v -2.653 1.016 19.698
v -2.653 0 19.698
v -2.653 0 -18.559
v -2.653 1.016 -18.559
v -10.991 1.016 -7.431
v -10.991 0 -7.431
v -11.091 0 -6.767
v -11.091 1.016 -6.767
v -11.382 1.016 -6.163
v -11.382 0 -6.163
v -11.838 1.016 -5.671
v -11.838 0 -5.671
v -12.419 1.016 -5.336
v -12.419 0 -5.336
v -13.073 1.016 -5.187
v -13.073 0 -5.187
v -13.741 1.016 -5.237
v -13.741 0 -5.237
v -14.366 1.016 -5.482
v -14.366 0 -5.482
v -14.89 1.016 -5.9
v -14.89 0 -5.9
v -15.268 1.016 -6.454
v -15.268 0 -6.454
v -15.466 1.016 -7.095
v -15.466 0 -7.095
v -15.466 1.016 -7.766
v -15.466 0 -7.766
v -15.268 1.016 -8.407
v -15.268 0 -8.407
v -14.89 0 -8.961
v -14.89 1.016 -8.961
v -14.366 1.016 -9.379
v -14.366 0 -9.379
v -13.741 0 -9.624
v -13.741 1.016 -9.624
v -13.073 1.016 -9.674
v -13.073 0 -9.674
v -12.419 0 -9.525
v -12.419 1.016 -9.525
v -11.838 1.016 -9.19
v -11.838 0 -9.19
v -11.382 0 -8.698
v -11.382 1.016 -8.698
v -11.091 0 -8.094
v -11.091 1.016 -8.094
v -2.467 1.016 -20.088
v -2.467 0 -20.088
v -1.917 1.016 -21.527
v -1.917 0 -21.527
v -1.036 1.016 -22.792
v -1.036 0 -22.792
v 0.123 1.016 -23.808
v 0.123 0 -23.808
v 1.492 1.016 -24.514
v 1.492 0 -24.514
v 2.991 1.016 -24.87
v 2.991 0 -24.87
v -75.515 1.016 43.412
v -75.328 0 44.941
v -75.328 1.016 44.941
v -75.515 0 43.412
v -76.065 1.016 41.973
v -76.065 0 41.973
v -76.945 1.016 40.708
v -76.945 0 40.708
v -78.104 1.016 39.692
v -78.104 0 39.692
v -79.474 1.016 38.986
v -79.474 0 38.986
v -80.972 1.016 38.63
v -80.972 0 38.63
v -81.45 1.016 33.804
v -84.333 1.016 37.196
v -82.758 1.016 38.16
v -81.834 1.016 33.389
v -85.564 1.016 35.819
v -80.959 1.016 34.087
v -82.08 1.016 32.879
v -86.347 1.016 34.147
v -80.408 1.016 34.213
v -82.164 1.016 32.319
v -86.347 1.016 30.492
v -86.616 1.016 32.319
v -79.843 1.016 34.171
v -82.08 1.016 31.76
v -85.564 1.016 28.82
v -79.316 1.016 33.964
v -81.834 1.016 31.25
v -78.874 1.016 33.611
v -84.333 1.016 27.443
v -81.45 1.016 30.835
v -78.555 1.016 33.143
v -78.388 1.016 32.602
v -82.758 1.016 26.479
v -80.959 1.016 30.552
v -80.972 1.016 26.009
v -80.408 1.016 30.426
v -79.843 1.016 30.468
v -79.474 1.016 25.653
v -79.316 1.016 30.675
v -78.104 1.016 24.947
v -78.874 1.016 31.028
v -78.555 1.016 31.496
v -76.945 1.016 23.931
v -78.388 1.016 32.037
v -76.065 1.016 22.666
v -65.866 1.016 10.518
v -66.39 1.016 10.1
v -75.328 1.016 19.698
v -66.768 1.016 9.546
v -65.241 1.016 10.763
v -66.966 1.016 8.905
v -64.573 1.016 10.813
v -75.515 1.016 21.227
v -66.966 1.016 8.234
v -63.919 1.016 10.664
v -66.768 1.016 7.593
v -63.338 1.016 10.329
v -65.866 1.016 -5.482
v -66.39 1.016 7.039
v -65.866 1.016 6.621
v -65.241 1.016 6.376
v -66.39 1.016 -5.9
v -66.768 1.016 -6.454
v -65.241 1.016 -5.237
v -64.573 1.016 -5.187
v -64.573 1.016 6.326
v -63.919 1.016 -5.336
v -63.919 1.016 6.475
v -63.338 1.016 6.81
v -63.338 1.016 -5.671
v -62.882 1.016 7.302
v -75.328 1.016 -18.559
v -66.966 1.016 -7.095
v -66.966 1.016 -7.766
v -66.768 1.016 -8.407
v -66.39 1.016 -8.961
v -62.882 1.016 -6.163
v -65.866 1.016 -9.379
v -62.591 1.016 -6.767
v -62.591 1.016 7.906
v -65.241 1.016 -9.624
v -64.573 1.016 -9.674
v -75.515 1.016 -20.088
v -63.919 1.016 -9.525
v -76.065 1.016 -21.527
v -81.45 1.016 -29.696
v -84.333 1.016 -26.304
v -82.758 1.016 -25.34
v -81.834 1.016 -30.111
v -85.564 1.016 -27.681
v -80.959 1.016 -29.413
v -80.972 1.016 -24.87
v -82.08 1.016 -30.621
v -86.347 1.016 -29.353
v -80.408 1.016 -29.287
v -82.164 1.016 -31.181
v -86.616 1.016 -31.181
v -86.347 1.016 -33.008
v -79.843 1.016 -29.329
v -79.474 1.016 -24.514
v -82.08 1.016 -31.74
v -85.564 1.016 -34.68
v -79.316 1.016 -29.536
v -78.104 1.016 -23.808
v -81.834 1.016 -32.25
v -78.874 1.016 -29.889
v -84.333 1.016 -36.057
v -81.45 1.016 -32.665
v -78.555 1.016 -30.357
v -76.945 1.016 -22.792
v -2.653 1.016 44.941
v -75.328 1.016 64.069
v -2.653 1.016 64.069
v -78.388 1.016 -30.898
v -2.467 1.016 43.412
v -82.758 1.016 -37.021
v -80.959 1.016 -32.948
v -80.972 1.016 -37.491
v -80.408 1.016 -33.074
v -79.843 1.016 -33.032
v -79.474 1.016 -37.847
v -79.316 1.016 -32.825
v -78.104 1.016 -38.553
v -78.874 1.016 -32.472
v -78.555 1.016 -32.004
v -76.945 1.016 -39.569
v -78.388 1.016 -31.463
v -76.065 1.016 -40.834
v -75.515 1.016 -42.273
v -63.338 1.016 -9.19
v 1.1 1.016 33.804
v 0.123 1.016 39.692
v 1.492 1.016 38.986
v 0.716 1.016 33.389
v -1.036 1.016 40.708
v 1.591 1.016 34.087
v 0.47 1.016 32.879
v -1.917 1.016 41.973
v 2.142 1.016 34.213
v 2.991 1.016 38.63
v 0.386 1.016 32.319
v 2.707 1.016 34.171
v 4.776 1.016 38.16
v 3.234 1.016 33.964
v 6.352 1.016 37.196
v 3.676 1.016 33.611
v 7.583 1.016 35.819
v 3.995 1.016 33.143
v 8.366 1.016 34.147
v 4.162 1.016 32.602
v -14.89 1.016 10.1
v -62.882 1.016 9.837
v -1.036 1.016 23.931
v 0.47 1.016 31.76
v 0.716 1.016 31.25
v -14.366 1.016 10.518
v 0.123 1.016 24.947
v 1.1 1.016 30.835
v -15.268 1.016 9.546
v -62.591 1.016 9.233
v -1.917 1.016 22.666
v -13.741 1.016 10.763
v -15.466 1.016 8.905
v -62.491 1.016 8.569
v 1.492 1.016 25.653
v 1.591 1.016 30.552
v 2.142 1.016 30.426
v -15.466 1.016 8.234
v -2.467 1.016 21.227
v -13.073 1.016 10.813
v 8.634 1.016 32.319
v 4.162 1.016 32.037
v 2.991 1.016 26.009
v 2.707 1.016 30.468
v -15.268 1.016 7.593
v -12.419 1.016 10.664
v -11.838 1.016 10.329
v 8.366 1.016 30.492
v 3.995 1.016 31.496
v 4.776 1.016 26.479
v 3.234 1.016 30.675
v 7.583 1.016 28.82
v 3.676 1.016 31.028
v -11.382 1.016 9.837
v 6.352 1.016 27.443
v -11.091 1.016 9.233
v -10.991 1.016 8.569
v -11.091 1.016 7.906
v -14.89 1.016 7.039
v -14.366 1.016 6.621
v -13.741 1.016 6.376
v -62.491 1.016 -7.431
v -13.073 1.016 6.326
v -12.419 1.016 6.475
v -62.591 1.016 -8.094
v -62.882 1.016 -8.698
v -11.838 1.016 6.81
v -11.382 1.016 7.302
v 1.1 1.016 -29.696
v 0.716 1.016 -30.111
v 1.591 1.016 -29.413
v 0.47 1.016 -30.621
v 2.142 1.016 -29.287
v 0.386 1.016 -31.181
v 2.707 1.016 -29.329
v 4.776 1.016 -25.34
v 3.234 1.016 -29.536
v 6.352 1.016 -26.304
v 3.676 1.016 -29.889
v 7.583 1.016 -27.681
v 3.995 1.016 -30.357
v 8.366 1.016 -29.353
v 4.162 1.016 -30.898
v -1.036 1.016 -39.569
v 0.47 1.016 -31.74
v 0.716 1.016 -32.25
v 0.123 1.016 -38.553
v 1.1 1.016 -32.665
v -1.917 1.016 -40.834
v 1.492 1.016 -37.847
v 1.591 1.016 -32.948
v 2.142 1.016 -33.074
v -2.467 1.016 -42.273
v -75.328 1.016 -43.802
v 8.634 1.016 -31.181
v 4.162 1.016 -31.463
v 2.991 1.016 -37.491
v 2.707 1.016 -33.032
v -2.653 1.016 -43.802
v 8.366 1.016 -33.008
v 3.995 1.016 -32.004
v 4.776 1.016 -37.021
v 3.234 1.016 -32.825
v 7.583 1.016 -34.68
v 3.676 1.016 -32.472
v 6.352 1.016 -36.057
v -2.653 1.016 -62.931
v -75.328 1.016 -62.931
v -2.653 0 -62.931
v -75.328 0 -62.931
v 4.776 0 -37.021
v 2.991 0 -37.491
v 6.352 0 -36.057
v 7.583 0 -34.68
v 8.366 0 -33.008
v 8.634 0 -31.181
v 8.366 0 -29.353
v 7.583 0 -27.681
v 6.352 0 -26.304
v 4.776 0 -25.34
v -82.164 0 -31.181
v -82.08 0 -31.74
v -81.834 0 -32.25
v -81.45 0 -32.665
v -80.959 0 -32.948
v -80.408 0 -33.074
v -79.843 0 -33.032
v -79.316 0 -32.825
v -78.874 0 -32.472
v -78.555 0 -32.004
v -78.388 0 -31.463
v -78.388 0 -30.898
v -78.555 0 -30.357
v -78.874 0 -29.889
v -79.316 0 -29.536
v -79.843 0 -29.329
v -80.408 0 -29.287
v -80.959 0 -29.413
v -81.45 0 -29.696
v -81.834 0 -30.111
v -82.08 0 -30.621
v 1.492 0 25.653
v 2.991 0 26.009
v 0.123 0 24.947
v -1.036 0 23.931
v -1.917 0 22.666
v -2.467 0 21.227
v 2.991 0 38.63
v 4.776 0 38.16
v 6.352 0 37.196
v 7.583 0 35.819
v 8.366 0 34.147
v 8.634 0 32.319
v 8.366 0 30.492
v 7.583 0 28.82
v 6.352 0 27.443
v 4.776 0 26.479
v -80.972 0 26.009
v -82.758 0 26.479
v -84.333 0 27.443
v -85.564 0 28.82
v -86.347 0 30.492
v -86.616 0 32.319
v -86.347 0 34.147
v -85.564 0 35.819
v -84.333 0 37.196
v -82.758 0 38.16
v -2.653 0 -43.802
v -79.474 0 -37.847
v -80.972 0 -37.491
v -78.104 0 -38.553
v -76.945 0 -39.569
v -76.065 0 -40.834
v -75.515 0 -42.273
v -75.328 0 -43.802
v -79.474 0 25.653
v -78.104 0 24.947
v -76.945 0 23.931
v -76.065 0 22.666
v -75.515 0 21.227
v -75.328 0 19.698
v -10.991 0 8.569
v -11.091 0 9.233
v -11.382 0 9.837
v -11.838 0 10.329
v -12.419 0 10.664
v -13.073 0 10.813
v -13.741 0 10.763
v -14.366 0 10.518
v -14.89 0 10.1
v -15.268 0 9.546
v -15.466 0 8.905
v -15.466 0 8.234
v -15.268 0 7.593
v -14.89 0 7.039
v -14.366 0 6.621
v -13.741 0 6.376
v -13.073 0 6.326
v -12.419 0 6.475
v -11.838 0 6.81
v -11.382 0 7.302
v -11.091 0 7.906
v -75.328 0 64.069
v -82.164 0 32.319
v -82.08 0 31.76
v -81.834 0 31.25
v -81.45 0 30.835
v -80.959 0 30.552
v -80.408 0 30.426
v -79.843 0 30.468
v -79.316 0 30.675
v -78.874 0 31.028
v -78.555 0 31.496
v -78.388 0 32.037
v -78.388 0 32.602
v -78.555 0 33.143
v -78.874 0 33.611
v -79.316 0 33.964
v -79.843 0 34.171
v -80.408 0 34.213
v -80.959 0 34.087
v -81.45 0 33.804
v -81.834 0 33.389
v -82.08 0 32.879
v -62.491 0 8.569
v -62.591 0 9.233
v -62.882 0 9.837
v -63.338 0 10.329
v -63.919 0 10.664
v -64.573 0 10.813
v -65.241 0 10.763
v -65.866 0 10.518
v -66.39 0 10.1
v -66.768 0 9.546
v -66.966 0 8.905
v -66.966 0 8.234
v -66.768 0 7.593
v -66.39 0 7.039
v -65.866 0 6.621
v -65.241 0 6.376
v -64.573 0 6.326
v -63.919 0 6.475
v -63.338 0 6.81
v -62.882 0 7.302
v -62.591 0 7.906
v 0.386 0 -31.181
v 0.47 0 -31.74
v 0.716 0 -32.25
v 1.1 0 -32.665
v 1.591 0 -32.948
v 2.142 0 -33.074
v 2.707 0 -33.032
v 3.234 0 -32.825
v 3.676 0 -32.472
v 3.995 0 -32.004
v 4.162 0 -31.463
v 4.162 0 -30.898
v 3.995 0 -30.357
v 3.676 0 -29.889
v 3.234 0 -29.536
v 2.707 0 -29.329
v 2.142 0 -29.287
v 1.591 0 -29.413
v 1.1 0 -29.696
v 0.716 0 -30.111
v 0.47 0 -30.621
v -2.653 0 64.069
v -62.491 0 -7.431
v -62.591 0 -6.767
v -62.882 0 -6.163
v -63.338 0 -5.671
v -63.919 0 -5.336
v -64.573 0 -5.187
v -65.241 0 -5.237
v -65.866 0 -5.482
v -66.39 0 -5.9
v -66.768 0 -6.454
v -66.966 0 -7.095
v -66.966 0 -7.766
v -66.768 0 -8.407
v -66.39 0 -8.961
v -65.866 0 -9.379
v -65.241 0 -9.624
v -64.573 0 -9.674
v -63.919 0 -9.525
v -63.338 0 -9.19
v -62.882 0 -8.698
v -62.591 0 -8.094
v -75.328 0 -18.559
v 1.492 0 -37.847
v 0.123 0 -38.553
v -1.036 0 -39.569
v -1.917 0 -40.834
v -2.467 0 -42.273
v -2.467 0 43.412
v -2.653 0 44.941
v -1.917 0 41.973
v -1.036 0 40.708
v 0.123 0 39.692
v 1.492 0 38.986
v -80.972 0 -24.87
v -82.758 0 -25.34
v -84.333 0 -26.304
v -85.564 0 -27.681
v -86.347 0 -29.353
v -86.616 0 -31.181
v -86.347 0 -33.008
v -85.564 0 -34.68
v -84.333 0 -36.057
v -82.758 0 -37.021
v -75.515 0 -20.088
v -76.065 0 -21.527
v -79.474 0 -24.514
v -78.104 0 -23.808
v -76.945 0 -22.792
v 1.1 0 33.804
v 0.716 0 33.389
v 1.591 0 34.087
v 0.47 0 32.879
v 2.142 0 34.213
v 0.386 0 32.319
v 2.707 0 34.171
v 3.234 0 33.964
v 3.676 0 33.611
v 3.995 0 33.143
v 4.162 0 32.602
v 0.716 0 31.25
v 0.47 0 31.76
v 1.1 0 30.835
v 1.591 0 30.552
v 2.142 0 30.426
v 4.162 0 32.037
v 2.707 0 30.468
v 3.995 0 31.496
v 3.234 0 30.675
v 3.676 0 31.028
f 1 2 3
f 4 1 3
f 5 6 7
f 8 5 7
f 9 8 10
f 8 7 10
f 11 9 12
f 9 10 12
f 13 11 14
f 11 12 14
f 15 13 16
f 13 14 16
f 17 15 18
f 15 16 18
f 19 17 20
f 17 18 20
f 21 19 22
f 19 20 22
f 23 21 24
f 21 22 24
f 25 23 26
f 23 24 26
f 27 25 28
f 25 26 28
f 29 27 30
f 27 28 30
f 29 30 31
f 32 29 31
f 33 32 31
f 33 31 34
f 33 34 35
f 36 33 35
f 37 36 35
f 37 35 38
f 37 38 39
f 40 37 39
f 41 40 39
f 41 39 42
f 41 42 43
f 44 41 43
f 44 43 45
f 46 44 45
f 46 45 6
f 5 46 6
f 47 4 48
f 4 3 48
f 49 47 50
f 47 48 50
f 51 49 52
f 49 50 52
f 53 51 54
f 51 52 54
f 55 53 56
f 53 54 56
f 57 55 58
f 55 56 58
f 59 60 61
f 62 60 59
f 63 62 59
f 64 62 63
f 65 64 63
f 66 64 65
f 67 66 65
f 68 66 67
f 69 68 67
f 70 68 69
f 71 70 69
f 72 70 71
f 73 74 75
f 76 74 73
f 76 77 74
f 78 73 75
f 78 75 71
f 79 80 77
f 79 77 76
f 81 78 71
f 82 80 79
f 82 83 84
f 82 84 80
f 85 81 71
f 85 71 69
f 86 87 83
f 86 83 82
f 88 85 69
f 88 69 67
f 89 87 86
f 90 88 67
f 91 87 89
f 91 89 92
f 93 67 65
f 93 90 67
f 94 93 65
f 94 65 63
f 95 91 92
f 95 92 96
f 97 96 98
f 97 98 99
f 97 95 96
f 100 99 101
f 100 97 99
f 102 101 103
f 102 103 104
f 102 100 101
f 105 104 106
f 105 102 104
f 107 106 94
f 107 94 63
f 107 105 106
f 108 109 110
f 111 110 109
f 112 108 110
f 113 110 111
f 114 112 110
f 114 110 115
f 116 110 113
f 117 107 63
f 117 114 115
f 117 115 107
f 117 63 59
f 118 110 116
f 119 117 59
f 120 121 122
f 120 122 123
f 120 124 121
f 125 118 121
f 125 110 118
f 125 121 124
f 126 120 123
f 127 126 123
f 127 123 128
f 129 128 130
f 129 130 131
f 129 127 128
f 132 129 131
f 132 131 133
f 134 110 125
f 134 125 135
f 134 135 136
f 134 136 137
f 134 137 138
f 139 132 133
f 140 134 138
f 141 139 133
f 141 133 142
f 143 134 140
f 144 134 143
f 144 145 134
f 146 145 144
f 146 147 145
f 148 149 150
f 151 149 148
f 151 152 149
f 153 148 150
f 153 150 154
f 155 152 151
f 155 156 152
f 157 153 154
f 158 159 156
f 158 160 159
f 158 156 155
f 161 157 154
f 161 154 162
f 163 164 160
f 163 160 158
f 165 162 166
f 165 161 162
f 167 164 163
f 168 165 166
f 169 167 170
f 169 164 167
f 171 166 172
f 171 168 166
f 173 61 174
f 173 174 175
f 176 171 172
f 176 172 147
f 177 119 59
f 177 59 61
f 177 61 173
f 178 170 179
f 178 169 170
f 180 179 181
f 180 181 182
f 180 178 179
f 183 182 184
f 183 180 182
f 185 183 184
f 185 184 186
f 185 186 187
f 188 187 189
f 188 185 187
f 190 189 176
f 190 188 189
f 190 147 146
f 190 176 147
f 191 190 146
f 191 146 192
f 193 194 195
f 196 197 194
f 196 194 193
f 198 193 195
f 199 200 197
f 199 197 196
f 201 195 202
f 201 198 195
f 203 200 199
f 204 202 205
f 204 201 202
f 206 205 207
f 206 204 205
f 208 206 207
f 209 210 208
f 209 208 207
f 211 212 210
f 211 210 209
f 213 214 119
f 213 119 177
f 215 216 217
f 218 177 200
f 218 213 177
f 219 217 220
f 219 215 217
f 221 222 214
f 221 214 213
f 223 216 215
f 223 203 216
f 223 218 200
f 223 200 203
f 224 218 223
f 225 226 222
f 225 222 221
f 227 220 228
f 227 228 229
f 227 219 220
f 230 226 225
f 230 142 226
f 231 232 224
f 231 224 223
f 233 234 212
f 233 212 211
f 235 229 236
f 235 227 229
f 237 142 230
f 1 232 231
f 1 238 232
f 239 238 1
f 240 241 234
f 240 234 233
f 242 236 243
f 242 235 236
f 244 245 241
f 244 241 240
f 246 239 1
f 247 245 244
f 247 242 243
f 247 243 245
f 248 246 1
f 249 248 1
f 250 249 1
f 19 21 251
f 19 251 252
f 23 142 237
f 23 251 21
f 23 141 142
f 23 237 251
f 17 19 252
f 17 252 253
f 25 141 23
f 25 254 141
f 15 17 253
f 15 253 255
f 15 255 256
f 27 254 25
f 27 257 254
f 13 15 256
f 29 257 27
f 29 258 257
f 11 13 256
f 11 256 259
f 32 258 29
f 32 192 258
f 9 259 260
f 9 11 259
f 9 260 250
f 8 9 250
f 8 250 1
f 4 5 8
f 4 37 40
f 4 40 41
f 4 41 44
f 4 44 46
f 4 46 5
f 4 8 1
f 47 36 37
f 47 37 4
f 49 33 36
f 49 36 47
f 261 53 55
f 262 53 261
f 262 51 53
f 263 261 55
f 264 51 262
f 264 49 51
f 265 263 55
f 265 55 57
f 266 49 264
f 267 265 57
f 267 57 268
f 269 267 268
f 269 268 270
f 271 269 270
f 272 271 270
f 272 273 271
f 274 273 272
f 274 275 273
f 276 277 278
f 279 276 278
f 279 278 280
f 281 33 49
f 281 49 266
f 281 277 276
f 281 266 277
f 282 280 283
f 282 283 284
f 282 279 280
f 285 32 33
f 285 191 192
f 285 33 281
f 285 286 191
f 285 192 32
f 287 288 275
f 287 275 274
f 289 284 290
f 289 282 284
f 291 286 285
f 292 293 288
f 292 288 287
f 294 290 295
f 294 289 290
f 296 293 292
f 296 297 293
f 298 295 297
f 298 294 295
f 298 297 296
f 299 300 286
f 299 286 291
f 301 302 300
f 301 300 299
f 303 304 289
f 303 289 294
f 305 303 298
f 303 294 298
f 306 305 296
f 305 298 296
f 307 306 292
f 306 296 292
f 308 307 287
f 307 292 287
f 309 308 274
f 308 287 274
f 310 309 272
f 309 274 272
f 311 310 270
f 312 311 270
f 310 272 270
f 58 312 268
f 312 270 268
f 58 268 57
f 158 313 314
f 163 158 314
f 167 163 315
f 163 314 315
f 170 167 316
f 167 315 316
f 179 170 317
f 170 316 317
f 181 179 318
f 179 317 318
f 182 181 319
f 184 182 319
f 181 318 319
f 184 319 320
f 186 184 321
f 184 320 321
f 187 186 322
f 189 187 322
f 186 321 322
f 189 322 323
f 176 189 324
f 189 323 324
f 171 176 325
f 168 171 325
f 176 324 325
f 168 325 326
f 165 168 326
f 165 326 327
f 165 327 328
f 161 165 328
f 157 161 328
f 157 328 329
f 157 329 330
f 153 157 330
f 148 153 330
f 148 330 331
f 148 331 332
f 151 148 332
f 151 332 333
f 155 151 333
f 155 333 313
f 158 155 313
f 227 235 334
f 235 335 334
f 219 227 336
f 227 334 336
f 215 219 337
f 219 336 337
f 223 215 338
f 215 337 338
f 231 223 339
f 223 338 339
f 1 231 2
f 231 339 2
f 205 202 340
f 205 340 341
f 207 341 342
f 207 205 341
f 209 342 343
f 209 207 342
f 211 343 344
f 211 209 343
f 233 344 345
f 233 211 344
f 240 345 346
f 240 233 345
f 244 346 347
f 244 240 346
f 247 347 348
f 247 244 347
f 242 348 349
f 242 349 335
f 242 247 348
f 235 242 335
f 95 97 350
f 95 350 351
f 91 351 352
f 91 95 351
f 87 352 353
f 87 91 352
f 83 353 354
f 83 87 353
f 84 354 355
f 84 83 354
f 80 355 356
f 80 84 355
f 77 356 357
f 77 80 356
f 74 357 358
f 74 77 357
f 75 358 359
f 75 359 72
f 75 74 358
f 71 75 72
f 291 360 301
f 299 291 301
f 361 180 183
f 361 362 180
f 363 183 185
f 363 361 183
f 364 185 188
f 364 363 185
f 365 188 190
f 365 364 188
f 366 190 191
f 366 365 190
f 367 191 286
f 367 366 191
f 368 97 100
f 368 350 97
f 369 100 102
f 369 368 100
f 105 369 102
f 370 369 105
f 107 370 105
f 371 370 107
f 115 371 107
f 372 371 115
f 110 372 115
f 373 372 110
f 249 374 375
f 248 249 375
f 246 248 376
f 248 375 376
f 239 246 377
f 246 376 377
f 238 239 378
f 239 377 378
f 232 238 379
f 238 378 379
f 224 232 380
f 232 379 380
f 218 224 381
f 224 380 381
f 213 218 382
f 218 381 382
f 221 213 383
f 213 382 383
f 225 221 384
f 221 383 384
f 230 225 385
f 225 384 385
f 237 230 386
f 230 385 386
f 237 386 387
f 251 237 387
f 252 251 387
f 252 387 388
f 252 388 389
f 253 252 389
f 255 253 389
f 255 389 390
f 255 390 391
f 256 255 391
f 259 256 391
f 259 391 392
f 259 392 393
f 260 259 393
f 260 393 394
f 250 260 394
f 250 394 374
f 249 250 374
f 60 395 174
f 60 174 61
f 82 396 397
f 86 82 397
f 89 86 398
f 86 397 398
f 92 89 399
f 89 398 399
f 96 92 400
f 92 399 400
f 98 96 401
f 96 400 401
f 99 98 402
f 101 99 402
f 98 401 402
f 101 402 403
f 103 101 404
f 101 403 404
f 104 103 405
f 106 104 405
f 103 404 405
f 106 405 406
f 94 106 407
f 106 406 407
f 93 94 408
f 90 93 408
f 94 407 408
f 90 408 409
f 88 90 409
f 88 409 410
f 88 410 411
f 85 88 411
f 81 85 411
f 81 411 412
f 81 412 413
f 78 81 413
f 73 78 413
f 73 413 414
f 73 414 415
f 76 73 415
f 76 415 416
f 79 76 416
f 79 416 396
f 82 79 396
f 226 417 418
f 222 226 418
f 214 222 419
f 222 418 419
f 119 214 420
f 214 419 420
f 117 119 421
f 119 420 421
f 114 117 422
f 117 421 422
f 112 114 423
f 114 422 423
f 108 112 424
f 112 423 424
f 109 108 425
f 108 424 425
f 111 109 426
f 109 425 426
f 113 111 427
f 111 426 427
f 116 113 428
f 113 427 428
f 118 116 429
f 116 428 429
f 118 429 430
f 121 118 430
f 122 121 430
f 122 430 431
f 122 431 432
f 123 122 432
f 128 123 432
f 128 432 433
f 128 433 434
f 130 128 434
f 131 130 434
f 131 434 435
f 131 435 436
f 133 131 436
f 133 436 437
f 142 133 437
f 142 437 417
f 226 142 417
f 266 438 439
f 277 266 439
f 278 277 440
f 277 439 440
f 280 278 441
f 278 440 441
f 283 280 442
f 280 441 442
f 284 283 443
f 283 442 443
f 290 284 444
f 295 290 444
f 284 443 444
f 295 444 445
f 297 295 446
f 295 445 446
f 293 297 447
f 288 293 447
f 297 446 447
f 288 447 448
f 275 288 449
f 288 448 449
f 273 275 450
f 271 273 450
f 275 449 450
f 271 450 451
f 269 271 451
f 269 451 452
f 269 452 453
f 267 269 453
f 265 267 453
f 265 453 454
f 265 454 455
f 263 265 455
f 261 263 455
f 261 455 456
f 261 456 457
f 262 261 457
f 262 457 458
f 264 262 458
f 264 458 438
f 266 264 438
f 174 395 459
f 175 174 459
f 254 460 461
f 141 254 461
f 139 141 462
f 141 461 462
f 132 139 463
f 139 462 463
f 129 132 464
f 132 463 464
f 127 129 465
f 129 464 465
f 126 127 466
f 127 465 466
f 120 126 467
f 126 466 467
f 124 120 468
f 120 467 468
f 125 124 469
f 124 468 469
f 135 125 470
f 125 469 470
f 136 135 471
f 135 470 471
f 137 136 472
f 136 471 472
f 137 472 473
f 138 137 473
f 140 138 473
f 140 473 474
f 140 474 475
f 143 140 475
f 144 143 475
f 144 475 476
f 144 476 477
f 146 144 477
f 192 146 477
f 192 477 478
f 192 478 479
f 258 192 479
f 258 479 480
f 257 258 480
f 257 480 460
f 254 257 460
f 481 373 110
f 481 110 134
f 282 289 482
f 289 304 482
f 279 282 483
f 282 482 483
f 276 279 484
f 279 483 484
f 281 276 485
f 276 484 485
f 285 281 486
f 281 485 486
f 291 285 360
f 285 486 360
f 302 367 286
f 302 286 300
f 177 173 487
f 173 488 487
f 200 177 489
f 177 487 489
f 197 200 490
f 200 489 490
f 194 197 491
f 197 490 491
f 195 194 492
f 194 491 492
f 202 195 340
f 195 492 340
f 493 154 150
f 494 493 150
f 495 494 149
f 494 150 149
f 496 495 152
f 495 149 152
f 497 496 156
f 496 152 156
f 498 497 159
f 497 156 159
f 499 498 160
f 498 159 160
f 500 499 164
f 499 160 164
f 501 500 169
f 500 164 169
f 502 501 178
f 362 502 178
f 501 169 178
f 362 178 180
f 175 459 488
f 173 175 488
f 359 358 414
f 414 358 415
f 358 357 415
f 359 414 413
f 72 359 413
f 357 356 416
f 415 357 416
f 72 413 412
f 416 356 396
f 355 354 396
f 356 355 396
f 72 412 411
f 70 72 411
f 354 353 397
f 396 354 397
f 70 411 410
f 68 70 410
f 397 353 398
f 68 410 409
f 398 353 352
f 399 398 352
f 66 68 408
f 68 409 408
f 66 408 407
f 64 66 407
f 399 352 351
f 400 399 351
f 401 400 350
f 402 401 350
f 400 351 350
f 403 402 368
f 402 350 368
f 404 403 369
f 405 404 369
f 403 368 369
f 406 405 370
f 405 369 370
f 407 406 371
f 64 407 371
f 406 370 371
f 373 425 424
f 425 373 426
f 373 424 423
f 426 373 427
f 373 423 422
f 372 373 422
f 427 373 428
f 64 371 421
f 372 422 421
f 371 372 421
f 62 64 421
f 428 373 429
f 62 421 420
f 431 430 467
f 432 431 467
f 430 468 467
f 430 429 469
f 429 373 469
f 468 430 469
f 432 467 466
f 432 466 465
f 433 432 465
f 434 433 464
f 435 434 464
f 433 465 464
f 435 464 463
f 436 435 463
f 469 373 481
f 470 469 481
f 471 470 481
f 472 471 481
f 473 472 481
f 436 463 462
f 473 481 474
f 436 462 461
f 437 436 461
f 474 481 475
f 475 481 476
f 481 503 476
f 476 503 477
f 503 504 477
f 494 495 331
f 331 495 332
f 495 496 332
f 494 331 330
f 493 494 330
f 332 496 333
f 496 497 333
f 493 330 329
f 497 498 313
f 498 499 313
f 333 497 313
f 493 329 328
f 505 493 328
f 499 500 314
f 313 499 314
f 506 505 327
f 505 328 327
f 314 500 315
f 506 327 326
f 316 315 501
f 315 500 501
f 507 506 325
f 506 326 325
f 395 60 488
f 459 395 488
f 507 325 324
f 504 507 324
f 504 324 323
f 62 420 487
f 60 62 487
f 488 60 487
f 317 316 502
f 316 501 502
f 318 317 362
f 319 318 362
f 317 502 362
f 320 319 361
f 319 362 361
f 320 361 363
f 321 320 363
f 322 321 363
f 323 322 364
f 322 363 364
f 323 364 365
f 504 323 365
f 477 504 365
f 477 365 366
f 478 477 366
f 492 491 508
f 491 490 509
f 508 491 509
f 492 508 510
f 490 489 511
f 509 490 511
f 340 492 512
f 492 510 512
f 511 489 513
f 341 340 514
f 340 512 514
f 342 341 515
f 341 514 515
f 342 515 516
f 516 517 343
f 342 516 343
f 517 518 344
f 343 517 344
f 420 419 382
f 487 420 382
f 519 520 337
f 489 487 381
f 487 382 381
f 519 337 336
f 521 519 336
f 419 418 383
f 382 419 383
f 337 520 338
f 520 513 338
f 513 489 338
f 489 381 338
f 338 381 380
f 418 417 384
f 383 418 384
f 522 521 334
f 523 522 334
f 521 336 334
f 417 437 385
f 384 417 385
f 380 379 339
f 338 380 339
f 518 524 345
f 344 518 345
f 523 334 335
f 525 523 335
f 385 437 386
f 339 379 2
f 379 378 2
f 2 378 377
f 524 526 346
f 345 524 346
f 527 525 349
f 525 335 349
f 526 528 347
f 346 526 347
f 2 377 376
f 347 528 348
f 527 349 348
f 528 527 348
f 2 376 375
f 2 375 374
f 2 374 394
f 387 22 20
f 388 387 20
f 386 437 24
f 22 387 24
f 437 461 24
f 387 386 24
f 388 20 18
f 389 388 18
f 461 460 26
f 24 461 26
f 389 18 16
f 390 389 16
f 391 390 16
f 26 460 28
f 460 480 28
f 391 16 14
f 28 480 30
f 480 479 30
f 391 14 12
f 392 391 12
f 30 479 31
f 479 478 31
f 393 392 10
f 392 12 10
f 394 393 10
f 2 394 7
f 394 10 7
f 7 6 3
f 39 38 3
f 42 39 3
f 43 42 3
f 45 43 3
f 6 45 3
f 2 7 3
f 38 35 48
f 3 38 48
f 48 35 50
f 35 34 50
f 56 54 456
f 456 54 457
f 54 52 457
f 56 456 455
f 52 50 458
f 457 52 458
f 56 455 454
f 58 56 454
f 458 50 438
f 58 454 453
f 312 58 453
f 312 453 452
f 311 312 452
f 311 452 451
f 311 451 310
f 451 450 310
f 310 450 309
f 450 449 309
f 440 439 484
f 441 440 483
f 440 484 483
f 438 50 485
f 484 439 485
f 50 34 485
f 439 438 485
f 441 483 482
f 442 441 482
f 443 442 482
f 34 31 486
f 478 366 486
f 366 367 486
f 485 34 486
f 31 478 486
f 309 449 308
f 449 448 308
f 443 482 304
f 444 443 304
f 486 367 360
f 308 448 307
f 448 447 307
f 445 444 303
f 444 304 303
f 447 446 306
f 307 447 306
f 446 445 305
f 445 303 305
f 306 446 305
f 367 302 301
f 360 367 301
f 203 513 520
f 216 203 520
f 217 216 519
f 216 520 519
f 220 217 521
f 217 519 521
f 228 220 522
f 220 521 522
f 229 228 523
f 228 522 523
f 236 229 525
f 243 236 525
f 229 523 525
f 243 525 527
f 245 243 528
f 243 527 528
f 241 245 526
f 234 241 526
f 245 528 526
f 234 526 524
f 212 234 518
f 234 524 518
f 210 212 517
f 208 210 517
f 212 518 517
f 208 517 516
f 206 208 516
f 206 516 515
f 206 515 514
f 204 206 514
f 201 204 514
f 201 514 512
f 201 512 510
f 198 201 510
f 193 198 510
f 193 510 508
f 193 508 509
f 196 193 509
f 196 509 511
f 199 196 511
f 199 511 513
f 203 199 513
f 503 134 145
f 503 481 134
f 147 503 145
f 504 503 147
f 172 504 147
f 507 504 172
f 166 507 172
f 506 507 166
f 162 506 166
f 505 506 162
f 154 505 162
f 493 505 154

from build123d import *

# Parameters (mm, degrees)
SKETCH1_W             = 72.675
SKETCH1_H             = 127
BOSS_EXTRUDE1_DEPTH   = 1.016
SKETCH2_R             = 2.25
CUT_EXTRUDE1_DEPTH    = 2.016
BOSS_EXTRUDE2_DEPTH   = 1.016
F_6_CLEARANCE_HOLE1_D = 3.7973
FILLET1_R             = 6.35


with BuildPart() as part:
    # Sketch1 → Boss-Extrude1 (new body)
    with BuildSketch(Plane(origin=(0, 0, 0), x_dir=(1, 0, 0), z_dir=(0, 1, 0))):
        with Locations((-38.990743482, -0.569490469)):
            Rectangle(SKETCH1_W, SKETCH1_H)
    extrude(amount=BOSS_EXTRUDE1_DEPTH)

    # Sketch2 → Cut-Extrude1 (cut, through all)
    with BuildSketch(Plane.XZ):
        with Locations((-64.740743482, 8.569490469)):
            Circle(SKETCH2_R)
        with Locations((-64.740743482, -7.430509531)):
            Circle(SKETCH2_R)
        with Locations((-13.240743482, -7.430509531)):
            Circle(SKETCH2_R)
        with Locations((-13.240743482, 8.569490469)):
            Circle(SKETCH2_R)
    extrude(amount=-CUT_EXTRUDE1_DEPTH, mode=Mode.SUBTRACT)

    # Sketch3 → Boss-Extrude2 (add)
    with BuildSketch(Plane(origin=(0, 1.016, 0), x_dir=(1, 0, 0), z_dir=(0, 1, 0))):
        with BuildLine():
            Line((-80.265743482, 37.530509531), (-75.328243482, 37.530509531))
            Line((-75.328243482, 37.530509531), (-75.328243482, 24.830509531))
            Line((-75.328243482, 24.830509531), (-80.265743482, 24.830509531))
            ThreePointArc((-80.265743482, 24.830509531), (-86.615743482, 31.180509531), (-80.265743482, 37.530509531))
        make_face()
        with BuildLine():
            Line((2.284256518, 24.830509531), (-2.653243482, 24.830509531))
            Line((-2.653243482, 24.830509531), (-2.653243482, 37.530509531))
            Line((-2.653243482, 37.530509531), (2.284256518, 37.530509531))
            ThreePointArc((2.284256518, 37.530509531), (8.634256518, 31.180509531), (2.284256518, 24.830509531))
        make_face()
        with BuildLine():
            Line((-75.328243482, -38.669490469), (-75.328243482, -25.969490469))
            Line((-75.328243482, -25.969490469), (-80.265743482, -25.969490469))
            ThreePointArc((-80.265743482, -25.969490469), (-86.615743482, -32.319490469), (-80.265743482, -38.669490469))
            Line((-80.265743482, -38.669490469), (-75.328243482, -38.669490469))
        make_face()
        with BuildLine():
            Line((2.284256518, -25.969490469), (-2.653243482, -25.969490469))
            Line((-2.653243482, -25.969490469), (-2.653243482, -38.669490469))
            Line((-2.653243482, -38.669490469), (2.284256518, -38.669490469))
            ThreePointArc((2.284256518, -38.669490469), (8.634256518, -32.319490469), (2.284256518, -25.969490469))
        make_face()
    extrude(amount=-BOSS_EXTRUDE2_DEPTH)

    # #6 Clearance Hole1 (through all)
    with Locations(Plane(origin=(0, 1.016, 0), x_dir=(1, 0, 0), z_dir=(0, 1, 0))):
        with Locations((-80.265743482, 31.180509531), (-80.265743482, -32.319490469), (2.284256518, -32.319490469), (2.284256518, 31.180509531)):
            Hole(F_6_CLEARANCE_HOLE1_D / 2)

    # Fillet1
    fillet1_edges = [part.edges().sort_by_distance(p)[0] for p in [
        (-75.328243482, 0.508, -37.530509531),
        (-75.328243482, 0.508, -24.830509531),
        (-75.328243482, 0.508, 25.969490469),
        (-75.328243482, 0.508, 38.669490469),
        (-2.653243482, 0.508, -24.830509531),
        (-2.653243482, 0.508, -37.530509531),
        (-2.653243482, 0.508, 25.969490469),
        (-2.653243482, 0.508, 38.669490469),
    ]]
    fillet(fillet1_edges, radius=FILLET1_R)


solid = part.part
